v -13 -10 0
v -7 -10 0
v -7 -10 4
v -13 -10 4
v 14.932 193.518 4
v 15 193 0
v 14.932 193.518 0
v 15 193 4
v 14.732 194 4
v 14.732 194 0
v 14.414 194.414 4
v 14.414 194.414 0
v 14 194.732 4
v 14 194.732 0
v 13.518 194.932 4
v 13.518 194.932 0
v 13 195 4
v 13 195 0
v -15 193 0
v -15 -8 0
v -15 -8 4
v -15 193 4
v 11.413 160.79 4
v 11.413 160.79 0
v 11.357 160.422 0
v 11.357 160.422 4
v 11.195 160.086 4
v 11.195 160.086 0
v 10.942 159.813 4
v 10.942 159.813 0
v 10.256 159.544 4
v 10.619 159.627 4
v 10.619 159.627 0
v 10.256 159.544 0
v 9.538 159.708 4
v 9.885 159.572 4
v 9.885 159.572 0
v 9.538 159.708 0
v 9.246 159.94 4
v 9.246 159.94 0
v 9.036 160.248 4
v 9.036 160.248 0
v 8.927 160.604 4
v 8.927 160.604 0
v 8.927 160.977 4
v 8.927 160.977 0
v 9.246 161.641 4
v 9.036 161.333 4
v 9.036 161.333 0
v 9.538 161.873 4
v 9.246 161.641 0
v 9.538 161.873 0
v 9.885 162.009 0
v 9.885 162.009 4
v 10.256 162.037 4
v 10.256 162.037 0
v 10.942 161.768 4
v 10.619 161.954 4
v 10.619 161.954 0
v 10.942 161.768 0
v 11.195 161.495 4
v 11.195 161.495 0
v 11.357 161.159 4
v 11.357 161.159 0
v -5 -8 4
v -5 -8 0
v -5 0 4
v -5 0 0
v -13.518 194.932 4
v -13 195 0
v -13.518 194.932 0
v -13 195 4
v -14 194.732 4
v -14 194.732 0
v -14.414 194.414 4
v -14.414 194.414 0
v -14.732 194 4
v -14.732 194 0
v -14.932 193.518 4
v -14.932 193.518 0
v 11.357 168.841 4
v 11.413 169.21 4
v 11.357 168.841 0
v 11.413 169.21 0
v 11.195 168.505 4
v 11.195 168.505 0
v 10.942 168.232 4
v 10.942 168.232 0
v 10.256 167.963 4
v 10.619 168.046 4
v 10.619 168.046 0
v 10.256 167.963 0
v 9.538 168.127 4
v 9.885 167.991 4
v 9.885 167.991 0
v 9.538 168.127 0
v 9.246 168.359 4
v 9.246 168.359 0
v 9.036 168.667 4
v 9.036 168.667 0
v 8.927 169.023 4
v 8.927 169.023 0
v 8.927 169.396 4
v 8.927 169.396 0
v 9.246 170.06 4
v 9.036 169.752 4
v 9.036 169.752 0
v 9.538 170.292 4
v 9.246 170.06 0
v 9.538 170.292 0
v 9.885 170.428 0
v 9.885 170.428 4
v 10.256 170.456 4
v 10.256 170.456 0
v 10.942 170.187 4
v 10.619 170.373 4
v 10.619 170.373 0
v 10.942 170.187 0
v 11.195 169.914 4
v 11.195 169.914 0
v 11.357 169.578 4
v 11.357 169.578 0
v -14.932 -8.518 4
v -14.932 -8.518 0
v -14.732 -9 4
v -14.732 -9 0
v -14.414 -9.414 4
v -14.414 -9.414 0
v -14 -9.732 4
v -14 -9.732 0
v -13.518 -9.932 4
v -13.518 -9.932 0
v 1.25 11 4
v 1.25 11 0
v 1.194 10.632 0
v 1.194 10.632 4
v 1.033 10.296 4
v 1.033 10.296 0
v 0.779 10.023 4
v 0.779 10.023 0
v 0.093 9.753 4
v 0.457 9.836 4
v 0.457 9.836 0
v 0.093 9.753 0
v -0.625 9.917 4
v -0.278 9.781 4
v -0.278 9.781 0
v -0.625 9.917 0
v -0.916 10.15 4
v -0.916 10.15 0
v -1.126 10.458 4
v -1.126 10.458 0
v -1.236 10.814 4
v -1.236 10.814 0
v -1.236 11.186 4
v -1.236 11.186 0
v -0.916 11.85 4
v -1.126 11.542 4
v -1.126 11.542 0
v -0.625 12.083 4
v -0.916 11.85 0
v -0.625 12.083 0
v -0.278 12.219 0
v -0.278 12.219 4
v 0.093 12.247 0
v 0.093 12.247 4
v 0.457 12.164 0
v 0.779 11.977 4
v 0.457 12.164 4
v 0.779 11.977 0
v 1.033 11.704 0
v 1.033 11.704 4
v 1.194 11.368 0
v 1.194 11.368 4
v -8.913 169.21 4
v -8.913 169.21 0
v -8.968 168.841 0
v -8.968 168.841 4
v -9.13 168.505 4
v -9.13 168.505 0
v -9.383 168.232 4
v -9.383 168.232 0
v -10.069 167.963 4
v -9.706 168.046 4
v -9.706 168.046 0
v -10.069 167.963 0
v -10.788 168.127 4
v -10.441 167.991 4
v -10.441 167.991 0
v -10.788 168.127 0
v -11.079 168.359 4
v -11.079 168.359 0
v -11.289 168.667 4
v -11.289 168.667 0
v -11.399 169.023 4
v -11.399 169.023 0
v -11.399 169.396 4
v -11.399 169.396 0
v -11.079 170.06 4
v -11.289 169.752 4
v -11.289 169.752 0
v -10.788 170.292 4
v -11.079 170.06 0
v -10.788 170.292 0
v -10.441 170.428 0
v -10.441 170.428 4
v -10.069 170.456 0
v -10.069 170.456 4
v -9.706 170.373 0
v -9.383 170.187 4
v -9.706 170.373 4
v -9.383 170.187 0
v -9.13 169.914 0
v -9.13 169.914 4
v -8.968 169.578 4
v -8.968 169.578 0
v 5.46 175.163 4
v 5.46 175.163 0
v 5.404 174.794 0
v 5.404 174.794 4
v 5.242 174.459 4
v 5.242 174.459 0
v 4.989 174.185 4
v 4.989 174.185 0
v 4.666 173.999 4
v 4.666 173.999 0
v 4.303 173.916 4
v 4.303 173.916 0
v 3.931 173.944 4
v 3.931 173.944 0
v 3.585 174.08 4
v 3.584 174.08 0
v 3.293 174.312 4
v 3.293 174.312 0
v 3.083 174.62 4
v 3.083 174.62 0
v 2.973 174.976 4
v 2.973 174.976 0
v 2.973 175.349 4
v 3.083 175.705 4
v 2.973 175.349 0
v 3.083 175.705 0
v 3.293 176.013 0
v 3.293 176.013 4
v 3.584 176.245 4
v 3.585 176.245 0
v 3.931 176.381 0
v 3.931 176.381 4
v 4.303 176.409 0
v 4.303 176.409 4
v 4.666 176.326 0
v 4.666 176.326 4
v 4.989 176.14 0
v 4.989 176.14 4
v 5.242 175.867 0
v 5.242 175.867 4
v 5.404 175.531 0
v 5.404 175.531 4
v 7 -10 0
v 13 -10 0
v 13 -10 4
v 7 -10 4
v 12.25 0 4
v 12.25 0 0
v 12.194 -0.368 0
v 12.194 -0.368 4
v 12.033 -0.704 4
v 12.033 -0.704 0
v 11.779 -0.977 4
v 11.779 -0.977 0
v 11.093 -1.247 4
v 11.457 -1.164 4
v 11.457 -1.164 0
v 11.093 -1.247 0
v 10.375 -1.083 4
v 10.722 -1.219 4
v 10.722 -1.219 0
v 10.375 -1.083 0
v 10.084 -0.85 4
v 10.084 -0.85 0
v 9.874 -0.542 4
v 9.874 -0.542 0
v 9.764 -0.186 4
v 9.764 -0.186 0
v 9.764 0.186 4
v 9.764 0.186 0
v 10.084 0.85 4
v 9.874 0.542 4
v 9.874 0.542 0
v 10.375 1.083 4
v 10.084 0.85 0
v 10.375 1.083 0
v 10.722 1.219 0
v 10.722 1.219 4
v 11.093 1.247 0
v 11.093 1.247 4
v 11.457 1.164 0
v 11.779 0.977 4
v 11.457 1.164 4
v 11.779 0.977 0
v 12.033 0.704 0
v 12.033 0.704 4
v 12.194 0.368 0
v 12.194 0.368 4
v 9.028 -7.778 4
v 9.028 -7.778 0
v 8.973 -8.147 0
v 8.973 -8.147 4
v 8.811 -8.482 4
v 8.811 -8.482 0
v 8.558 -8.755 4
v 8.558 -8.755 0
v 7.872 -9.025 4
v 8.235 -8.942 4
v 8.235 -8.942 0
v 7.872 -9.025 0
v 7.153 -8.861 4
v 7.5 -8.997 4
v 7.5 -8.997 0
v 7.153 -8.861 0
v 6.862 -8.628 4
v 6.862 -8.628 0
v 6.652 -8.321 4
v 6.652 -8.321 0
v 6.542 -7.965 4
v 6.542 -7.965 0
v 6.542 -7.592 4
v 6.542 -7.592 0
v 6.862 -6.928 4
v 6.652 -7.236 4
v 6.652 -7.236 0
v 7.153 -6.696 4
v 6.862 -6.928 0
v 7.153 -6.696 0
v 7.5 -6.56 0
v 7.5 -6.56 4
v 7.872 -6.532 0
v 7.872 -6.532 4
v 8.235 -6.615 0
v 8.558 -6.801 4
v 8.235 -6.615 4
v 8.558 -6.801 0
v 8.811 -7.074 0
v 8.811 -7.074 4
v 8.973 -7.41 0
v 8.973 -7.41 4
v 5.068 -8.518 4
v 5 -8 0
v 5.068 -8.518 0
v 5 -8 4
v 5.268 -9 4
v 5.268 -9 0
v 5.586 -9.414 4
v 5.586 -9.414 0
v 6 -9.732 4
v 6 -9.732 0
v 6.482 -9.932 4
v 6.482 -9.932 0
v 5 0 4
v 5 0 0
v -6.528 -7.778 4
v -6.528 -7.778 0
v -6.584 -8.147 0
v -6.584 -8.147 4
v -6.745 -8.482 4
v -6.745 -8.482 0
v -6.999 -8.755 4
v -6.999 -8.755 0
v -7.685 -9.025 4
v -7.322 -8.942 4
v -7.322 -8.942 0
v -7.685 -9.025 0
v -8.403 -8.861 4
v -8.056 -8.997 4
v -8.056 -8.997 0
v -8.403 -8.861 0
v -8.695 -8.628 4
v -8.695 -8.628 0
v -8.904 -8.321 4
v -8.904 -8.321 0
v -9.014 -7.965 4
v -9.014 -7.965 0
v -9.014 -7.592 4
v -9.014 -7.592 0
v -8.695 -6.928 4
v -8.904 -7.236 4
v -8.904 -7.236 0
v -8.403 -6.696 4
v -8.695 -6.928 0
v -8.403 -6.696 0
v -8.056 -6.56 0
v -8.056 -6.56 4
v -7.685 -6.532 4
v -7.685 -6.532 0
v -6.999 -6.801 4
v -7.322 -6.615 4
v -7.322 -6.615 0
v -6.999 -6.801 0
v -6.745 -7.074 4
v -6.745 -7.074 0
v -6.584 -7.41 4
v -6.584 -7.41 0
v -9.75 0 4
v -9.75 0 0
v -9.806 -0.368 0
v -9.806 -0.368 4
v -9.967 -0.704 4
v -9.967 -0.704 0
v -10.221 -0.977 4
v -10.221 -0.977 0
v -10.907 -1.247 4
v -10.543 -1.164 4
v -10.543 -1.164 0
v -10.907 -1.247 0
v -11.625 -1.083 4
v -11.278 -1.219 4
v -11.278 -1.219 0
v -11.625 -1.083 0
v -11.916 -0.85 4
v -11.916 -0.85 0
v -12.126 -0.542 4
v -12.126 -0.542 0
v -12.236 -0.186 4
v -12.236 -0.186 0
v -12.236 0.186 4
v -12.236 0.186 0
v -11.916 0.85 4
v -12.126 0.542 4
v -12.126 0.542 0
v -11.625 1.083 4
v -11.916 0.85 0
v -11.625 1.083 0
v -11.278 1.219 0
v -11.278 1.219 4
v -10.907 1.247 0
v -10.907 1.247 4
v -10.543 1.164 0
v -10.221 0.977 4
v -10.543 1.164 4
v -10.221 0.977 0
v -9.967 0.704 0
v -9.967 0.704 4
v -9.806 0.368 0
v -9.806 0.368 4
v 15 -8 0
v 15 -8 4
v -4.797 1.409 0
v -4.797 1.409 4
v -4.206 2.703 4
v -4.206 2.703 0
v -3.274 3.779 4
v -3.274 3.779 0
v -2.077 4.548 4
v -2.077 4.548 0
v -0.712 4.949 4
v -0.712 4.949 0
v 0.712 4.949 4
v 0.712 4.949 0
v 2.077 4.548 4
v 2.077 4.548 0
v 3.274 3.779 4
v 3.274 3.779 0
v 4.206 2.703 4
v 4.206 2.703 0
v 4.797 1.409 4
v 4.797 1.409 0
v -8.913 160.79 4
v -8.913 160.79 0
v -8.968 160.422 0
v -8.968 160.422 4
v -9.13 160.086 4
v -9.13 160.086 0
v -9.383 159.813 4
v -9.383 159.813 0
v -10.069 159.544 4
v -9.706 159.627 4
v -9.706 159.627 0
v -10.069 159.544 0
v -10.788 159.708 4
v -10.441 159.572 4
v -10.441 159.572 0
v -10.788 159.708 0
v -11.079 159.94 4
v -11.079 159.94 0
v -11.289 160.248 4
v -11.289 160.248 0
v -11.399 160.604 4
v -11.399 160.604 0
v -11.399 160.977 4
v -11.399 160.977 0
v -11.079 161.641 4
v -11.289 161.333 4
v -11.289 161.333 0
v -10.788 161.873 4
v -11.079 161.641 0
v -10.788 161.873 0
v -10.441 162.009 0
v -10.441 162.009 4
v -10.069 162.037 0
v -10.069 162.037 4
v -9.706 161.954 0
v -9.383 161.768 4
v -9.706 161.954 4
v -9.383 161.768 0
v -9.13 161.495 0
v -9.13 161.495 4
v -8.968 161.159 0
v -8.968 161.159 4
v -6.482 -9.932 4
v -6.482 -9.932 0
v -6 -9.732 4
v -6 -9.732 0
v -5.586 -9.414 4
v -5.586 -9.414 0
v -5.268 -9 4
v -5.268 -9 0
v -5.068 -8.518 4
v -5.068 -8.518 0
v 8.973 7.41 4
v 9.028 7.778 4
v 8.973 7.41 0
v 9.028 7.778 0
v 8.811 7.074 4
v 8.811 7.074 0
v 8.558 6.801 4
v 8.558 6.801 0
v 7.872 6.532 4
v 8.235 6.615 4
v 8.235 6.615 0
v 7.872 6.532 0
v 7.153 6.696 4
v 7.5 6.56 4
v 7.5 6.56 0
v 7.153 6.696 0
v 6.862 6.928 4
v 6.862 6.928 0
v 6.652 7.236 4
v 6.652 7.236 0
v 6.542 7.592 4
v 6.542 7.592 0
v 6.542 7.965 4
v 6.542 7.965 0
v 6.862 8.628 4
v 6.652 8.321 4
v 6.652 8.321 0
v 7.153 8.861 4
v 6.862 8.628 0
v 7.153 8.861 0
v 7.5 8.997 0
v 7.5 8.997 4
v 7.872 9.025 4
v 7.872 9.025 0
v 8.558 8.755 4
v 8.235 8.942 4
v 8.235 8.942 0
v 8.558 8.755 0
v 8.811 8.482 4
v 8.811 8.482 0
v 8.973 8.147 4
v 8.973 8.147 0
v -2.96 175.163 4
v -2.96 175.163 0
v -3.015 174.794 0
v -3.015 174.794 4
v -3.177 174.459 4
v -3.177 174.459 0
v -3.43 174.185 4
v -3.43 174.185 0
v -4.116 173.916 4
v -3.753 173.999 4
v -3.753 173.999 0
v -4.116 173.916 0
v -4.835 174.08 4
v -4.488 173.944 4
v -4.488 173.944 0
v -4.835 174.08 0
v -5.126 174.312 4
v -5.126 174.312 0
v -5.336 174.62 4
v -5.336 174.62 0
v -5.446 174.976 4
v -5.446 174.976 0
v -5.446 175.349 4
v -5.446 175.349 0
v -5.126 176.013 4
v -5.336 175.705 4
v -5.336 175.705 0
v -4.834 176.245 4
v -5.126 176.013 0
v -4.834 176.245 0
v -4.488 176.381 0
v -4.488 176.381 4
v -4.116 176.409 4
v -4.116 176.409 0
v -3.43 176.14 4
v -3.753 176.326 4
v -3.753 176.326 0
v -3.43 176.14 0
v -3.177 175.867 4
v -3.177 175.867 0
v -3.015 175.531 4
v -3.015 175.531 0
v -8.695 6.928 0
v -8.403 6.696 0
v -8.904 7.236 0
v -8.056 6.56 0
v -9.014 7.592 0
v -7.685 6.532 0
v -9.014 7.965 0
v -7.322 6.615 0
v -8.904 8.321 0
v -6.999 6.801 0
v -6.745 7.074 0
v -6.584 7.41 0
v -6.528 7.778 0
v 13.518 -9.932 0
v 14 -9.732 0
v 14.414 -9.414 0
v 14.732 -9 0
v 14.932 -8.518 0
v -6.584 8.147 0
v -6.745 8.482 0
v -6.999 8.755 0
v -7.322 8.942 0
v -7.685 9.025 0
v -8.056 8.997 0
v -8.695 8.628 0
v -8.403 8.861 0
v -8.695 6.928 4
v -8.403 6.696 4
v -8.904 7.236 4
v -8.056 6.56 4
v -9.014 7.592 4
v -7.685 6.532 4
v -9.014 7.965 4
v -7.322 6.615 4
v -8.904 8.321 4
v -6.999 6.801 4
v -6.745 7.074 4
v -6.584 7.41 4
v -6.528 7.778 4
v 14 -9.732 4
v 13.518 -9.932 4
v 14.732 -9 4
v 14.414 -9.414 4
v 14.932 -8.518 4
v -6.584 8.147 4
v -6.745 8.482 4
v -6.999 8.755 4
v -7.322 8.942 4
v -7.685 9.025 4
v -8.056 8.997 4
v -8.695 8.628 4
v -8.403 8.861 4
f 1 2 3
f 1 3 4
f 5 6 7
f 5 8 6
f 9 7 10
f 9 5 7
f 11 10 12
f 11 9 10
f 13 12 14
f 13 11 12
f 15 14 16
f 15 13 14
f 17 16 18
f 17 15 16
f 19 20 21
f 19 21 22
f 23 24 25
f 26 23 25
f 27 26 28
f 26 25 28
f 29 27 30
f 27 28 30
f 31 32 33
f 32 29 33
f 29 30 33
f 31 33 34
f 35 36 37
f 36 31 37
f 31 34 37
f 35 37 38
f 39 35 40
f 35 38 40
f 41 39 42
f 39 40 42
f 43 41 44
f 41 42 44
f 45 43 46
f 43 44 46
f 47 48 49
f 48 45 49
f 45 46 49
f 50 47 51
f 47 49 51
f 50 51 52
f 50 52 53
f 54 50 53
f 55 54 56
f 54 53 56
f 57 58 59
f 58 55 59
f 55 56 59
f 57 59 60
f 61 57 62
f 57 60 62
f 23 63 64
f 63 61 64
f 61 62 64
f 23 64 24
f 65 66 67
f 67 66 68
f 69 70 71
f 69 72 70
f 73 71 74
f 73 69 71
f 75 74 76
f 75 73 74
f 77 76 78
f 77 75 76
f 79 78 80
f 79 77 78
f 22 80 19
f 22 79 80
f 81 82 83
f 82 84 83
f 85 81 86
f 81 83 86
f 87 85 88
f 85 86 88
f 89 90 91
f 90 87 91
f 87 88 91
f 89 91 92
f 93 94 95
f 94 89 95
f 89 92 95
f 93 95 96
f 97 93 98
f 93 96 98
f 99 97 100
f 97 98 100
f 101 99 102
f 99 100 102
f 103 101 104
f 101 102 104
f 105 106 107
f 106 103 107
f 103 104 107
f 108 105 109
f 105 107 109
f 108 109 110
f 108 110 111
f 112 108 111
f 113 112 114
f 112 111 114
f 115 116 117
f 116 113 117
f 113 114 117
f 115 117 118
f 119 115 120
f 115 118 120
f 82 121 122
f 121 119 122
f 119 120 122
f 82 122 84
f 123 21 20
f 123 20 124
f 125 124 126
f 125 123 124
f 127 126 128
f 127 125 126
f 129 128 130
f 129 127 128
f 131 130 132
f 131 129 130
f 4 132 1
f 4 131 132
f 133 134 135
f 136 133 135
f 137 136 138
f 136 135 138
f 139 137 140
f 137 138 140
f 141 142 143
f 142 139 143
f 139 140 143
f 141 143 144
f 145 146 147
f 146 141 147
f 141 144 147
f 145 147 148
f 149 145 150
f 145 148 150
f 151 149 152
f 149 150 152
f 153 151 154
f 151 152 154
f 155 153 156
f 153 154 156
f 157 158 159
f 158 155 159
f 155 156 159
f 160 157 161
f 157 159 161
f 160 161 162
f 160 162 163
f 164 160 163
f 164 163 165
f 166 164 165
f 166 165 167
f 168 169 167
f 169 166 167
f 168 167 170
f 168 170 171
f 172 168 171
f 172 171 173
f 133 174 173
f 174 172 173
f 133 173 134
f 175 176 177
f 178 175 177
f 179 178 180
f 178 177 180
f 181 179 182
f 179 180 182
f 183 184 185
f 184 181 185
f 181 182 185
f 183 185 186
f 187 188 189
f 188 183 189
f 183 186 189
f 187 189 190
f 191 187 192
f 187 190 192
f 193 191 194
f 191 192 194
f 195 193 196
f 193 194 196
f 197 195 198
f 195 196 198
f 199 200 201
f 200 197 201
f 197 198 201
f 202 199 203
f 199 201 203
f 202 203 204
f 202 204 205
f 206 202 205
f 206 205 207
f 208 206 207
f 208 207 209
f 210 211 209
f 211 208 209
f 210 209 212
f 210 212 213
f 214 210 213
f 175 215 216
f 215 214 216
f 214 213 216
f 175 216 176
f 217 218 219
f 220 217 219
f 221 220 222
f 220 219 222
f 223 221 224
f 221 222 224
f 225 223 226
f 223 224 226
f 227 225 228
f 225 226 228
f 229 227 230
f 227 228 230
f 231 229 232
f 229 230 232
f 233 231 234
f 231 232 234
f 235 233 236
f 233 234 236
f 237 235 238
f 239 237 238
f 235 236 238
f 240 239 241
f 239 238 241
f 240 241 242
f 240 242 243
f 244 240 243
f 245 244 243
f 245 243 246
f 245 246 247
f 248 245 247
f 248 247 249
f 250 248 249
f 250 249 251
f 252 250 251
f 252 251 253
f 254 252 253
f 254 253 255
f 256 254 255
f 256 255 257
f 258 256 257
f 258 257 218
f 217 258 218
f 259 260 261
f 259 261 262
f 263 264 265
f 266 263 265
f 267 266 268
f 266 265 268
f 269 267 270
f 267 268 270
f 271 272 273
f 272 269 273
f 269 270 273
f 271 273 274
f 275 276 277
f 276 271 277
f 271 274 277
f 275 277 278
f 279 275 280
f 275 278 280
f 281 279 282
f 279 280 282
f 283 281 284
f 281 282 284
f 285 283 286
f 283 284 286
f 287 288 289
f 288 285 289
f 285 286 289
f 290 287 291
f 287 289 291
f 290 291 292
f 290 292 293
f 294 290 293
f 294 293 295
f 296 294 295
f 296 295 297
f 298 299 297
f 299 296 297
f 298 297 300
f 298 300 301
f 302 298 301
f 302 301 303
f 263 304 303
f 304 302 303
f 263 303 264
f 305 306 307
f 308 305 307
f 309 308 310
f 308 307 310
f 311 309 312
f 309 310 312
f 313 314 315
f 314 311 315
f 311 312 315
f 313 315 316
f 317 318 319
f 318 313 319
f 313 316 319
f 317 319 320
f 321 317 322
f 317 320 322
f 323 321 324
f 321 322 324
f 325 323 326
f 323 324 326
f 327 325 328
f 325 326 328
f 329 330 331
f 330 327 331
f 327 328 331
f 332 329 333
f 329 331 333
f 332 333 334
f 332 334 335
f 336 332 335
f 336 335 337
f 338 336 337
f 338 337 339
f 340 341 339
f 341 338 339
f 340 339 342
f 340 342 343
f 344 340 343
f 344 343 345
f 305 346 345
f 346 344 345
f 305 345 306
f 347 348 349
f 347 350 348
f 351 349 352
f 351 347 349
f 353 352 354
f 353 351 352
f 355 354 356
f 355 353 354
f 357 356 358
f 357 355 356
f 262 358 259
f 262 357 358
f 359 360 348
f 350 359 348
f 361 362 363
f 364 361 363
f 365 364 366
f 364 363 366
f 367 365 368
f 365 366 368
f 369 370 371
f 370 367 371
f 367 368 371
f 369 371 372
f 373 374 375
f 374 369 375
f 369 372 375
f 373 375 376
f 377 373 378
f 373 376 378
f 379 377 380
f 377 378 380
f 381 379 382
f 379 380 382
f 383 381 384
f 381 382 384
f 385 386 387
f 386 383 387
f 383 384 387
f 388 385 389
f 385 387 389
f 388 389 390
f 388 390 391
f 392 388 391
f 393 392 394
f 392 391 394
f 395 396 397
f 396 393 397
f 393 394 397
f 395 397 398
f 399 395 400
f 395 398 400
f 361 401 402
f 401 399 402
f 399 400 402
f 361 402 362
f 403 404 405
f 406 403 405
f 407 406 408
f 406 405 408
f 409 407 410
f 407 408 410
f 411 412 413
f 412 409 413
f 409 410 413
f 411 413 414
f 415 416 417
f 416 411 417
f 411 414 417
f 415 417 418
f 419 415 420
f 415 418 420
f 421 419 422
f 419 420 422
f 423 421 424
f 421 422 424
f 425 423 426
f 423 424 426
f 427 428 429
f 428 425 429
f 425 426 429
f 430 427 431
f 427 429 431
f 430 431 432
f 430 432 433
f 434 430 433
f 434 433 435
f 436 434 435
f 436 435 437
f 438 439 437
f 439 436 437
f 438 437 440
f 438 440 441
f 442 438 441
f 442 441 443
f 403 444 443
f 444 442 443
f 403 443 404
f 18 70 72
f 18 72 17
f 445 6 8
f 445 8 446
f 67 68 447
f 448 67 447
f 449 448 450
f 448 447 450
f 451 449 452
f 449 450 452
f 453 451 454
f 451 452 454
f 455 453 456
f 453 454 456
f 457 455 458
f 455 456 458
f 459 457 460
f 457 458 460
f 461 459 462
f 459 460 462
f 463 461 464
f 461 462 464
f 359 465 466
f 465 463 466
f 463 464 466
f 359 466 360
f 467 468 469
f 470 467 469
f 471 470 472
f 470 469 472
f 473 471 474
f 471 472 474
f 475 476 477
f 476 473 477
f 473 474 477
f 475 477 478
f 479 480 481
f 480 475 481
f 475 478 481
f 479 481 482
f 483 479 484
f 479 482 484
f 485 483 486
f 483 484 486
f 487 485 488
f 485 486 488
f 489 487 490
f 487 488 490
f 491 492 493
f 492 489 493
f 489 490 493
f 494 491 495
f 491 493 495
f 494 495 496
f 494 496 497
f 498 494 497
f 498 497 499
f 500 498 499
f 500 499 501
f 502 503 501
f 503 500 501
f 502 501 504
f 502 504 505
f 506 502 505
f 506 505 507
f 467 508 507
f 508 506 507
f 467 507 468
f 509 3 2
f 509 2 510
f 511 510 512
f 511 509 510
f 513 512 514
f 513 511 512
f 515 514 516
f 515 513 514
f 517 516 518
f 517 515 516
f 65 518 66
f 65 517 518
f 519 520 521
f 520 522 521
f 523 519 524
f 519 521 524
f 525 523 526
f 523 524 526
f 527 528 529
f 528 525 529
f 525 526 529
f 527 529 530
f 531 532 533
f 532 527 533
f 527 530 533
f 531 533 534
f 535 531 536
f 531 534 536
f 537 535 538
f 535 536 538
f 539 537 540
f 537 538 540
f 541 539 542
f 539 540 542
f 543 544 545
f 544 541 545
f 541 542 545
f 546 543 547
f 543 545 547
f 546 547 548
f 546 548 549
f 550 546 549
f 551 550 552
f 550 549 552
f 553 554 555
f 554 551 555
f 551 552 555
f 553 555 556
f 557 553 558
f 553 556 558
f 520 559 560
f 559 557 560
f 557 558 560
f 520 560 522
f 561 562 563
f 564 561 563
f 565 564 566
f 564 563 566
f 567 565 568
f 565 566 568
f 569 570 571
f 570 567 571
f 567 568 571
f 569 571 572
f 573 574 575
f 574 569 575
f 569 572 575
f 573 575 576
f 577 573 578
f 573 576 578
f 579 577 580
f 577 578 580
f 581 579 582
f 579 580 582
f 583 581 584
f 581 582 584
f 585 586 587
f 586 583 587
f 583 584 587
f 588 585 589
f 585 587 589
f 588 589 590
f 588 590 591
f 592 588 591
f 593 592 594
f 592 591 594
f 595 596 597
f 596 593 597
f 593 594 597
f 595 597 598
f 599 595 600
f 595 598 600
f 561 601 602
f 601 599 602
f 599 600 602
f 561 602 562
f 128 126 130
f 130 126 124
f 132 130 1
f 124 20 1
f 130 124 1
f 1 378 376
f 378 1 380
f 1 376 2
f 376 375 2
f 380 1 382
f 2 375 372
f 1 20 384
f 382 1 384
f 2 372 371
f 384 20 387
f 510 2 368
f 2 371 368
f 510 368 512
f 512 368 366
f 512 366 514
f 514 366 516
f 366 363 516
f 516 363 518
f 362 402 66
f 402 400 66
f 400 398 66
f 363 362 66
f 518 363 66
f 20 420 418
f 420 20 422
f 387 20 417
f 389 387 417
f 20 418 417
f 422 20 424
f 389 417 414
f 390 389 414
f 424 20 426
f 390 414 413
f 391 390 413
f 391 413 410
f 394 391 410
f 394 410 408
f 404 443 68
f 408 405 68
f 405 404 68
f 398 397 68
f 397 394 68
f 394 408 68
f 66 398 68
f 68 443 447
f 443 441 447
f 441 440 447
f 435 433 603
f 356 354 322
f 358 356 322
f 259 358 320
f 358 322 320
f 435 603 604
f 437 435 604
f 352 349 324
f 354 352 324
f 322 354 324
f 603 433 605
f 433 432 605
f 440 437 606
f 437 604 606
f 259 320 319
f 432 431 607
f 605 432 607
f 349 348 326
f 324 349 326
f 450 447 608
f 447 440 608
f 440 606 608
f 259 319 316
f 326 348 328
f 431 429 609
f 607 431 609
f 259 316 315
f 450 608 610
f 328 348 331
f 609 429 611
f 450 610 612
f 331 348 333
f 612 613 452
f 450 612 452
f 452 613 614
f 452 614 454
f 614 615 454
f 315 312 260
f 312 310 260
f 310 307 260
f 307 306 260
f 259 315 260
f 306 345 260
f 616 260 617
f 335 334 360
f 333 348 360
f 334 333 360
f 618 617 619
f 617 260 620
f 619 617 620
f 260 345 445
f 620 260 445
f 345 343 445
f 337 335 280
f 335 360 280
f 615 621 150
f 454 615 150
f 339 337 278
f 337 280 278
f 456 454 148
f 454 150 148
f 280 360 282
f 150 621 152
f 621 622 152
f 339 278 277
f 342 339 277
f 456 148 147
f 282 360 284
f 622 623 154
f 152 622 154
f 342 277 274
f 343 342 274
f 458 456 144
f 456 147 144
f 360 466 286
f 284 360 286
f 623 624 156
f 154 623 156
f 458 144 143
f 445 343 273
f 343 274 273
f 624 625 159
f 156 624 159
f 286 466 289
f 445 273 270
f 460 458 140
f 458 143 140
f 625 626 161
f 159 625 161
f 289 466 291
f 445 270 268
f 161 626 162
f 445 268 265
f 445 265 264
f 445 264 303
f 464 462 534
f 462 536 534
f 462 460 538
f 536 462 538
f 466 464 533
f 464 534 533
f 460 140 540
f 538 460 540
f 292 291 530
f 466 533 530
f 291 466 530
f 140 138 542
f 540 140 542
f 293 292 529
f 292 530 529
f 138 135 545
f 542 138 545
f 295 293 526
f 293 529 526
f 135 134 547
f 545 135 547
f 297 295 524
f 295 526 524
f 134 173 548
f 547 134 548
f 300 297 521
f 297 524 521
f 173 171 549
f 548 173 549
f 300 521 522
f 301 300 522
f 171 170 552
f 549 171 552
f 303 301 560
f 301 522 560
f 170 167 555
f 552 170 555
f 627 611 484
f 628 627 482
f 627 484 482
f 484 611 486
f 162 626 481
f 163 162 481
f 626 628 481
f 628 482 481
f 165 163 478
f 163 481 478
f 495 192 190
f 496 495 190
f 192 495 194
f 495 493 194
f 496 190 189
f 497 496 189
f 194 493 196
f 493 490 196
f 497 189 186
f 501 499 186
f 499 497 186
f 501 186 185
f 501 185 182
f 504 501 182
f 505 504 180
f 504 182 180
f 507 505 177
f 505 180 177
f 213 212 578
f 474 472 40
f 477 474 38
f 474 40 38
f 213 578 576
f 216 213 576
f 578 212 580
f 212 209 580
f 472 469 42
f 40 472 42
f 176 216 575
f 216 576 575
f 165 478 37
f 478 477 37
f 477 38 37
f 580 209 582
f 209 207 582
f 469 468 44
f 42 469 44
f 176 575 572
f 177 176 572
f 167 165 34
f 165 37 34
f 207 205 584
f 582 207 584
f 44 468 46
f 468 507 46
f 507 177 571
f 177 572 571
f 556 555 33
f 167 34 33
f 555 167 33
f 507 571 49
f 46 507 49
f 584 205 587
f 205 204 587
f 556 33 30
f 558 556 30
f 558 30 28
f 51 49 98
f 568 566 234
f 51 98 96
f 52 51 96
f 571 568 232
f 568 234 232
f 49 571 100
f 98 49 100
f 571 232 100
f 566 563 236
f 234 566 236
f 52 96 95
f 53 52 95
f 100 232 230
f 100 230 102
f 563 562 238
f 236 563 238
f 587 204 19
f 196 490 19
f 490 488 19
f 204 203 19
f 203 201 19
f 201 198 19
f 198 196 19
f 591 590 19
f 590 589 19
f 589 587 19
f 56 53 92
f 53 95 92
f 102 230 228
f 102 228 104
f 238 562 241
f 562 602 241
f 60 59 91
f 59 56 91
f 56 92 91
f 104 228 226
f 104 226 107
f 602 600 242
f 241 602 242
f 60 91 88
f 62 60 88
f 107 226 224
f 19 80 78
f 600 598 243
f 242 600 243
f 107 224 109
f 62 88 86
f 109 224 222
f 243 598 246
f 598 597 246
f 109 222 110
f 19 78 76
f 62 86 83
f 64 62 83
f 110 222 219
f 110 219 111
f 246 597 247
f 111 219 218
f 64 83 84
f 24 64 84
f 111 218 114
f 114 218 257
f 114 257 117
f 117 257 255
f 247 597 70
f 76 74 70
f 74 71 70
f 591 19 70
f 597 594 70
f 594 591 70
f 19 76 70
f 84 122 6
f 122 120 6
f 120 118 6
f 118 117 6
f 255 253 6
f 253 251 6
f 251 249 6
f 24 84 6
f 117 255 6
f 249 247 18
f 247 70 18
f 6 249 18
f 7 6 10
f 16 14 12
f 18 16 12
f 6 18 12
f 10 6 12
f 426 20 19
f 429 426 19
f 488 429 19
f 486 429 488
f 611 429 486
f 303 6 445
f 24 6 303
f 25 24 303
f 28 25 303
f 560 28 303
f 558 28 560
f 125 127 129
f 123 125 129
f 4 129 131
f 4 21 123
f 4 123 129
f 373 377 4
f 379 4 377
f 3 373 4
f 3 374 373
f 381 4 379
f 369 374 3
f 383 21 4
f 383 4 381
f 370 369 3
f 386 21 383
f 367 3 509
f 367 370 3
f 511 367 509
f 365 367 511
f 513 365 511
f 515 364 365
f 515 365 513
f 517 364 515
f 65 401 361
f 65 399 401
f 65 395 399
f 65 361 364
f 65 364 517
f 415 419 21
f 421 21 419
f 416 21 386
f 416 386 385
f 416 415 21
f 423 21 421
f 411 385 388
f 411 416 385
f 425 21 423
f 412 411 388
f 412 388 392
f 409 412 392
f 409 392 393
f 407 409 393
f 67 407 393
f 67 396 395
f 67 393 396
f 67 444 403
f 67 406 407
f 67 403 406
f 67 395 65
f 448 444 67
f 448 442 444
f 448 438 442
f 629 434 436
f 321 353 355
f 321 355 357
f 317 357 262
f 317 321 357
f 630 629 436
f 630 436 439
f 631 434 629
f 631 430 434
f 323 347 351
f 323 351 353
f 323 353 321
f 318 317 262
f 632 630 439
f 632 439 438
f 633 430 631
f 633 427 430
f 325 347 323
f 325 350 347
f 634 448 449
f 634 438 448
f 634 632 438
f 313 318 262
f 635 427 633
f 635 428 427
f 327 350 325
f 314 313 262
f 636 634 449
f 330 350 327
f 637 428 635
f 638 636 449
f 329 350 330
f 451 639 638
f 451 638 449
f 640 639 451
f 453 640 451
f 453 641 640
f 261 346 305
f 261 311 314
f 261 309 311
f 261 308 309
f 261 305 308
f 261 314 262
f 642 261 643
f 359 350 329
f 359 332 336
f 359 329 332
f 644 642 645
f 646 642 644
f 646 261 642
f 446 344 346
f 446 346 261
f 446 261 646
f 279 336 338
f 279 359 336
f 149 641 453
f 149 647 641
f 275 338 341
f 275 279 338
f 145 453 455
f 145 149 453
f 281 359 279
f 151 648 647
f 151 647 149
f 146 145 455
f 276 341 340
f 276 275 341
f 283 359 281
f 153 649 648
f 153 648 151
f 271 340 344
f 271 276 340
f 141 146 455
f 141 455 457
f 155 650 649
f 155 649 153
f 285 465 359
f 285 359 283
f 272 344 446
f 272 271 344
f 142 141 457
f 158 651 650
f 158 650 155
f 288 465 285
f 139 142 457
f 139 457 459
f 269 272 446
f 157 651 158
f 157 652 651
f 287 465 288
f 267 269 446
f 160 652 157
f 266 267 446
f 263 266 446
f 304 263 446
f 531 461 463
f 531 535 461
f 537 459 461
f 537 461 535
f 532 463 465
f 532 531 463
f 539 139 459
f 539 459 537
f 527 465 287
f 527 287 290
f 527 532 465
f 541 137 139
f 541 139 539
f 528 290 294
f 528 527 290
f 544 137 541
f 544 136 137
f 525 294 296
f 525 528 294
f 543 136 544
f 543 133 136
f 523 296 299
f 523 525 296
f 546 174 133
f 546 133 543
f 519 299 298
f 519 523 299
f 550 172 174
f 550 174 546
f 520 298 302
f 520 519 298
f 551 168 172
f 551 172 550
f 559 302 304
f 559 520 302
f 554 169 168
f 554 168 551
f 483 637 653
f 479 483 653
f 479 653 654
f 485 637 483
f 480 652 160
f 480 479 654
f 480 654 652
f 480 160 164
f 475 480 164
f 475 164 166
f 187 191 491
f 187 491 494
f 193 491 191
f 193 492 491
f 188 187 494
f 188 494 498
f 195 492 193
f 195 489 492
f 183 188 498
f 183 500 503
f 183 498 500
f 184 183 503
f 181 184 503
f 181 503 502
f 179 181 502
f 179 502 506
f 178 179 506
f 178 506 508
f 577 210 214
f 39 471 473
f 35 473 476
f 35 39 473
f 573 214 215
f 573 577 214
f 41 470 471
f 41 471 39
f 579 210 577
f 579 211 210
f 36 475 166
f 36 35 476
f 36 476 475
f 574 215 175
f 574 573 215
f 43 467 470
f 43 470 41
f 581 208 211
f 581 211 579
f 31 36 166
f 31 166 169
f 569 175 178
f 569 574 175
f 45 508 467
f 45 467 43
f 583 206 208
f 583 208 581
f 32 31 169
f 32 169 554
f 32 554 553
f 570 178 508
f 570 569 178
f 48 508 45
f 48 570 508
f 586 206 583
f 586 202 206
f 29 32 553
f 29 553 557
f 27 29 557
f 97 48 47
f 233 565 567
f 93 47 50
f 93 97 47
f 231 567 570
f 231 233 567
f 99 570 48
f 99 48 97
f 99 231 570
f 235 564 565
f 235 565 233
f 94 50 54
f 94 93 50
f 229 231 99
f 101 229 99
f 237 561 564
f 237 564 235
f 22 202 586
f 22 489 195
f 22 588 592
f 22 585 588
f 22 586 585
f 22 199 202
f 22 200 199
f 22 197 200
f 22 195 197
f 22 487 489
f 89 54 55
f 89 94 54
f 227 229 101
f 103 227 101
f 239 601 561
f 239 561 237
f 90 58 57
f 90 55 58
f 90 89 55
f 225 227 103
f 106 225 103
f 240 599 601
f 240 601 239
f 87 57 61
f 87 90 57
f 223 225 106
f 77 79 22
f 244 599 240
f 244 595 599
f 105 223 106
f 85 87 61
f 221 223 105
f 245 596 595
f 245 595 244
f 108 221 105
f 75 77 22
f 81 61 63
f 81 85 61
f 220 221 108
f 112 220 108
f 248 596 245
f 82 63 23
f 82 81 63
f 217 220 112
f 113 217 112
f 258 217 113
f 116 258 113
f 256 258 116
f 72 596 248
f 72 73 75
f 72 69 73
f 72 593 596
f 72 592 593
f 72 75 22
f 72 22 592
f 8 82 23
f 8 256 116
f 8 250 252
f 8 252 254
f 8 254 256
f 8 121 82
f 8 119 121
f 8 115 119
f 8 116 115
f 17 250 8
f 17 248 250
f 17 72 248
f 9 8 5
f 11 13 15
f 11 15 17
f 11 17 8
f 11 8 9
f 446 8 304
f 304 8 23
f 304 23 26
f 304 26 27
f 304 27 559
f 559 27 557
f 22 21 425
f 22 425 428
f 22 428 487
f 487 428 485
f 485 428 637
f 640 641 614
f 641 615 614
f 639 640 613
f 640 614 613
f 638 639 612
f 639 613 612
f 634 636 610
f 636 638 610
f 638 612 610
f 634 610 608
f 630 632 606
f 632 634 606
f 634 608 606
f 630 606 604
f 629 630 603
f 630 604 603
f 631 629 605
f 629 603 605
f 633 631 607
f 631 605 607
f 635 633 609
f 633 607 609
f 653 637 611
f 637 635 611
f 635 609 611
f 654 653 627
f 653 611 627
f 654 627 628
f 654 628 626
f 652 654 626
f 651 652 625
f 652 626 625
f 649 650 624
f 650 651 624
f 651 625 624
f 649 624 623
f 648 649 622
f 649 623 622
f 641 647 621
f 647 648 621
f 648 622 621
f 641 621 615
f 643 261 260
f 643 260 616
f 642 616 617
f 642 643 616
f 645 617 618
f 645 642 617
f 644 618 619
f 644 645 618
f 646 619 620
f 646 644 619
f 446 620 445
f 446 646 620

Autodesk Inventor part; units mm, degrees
ref_plane "YZ Plane" through (0, 0, 0) normal (1, 0, 0) x (0, 1, 0)
ref_plane "XZ Plane" through (0, 0, 0) normal (0, 1, 0) x (-1, 0, 0)
ref_plane "XY Plane" through (0, 0, 0) normal (0, 0, 1) x (1, 0, 0)
sketch "스케치1" plane through (0, 0, 0) normal (0, 0, 1) x (1, 0, 0)
  circle A0 centre (7.7782, 7.7782) radius 1.25
  circle A1 centre (-7.7782, 7.7782) radius 1.25
  circle A2 centre (7.7782, -7.7782) radius 1.25
  circle A3 centre (-11, 0) radius 1.25
  circle A4 centre (11, 0) radius 1.25
  circle A5 centre (0, 11) radius 1.25
  circle A6 centre (0, -11) radius 1.25
  circle A7 centre (-7.7782, -7.7782) radius 1.25
  circle A8 centre (0, 0) radius 14
  circle A9 centre (0, 0) radius 5
  circle A10 centre (0, 0) radius 5
  line L0 (5, 0) -> (5, -10)
  line L1 (5, -10) -> (-5, -10)
  line L2 (-5, -10) -> (-5, 0)
  line L3 (15, -10) -> (-15, -10)
  line L4 (-15, -10) -> (-15, 195)
  line L5 (-15, 195) -> (15, 195)
  line L6 (15, 195) -> (15, -10)
  line L7 (0, 195) -> (0, 165)
  line L8 (0, 165) -> (4.2095, 175.1627)
  line L9 (0, 165) -> (11, 165) construction
  circle A11 centre (4.2095, 175.1627) radius 1.25
  circle A12 centre (-4.2095, 175.1627) radius 1.25
  circle A13 centre (-10.1627, 169.2095) radius 1.25
  circle A14 centre (-10.1627, 160.7905) radius 1.25
  circle A15 centre (-4.2095, 154.8373) radius 1.25
  circle A16 centre (4.2095, 154.8373) radius 1.25
  circle A17 centre (10.1627, 160.7905) radius 1.25
  circle A18 centre (10.1627, 169.2095) radius 1.25
  dimension "d0" = 10
  dimension "d2" = 30
  dimension "d3" = 205
  dimension "d4" = 30
  dimension "d6" = 11
  dimension "d7" = 67.5
  dimension "d8" = 2.5
  dimension "d11" = 360
extrude "판1" add sketch "스케치1" along normal blind 4 contours L0 A9 L2 L3 A8 | A8 L3 L4 L5 L6 | A15 | A16
fillet "모서리 라운드1" radius 2 6 edges at (15, -10, 2) (5, -10, 2) (-5, -10, 2) (-15, -10, 2) (15, 195, 2) (-15, 195, 2)
equation "\"TransitionRadius\" = BendRadius"
equation "\"BendRadius\" = 4"
properties part number "bar2"
